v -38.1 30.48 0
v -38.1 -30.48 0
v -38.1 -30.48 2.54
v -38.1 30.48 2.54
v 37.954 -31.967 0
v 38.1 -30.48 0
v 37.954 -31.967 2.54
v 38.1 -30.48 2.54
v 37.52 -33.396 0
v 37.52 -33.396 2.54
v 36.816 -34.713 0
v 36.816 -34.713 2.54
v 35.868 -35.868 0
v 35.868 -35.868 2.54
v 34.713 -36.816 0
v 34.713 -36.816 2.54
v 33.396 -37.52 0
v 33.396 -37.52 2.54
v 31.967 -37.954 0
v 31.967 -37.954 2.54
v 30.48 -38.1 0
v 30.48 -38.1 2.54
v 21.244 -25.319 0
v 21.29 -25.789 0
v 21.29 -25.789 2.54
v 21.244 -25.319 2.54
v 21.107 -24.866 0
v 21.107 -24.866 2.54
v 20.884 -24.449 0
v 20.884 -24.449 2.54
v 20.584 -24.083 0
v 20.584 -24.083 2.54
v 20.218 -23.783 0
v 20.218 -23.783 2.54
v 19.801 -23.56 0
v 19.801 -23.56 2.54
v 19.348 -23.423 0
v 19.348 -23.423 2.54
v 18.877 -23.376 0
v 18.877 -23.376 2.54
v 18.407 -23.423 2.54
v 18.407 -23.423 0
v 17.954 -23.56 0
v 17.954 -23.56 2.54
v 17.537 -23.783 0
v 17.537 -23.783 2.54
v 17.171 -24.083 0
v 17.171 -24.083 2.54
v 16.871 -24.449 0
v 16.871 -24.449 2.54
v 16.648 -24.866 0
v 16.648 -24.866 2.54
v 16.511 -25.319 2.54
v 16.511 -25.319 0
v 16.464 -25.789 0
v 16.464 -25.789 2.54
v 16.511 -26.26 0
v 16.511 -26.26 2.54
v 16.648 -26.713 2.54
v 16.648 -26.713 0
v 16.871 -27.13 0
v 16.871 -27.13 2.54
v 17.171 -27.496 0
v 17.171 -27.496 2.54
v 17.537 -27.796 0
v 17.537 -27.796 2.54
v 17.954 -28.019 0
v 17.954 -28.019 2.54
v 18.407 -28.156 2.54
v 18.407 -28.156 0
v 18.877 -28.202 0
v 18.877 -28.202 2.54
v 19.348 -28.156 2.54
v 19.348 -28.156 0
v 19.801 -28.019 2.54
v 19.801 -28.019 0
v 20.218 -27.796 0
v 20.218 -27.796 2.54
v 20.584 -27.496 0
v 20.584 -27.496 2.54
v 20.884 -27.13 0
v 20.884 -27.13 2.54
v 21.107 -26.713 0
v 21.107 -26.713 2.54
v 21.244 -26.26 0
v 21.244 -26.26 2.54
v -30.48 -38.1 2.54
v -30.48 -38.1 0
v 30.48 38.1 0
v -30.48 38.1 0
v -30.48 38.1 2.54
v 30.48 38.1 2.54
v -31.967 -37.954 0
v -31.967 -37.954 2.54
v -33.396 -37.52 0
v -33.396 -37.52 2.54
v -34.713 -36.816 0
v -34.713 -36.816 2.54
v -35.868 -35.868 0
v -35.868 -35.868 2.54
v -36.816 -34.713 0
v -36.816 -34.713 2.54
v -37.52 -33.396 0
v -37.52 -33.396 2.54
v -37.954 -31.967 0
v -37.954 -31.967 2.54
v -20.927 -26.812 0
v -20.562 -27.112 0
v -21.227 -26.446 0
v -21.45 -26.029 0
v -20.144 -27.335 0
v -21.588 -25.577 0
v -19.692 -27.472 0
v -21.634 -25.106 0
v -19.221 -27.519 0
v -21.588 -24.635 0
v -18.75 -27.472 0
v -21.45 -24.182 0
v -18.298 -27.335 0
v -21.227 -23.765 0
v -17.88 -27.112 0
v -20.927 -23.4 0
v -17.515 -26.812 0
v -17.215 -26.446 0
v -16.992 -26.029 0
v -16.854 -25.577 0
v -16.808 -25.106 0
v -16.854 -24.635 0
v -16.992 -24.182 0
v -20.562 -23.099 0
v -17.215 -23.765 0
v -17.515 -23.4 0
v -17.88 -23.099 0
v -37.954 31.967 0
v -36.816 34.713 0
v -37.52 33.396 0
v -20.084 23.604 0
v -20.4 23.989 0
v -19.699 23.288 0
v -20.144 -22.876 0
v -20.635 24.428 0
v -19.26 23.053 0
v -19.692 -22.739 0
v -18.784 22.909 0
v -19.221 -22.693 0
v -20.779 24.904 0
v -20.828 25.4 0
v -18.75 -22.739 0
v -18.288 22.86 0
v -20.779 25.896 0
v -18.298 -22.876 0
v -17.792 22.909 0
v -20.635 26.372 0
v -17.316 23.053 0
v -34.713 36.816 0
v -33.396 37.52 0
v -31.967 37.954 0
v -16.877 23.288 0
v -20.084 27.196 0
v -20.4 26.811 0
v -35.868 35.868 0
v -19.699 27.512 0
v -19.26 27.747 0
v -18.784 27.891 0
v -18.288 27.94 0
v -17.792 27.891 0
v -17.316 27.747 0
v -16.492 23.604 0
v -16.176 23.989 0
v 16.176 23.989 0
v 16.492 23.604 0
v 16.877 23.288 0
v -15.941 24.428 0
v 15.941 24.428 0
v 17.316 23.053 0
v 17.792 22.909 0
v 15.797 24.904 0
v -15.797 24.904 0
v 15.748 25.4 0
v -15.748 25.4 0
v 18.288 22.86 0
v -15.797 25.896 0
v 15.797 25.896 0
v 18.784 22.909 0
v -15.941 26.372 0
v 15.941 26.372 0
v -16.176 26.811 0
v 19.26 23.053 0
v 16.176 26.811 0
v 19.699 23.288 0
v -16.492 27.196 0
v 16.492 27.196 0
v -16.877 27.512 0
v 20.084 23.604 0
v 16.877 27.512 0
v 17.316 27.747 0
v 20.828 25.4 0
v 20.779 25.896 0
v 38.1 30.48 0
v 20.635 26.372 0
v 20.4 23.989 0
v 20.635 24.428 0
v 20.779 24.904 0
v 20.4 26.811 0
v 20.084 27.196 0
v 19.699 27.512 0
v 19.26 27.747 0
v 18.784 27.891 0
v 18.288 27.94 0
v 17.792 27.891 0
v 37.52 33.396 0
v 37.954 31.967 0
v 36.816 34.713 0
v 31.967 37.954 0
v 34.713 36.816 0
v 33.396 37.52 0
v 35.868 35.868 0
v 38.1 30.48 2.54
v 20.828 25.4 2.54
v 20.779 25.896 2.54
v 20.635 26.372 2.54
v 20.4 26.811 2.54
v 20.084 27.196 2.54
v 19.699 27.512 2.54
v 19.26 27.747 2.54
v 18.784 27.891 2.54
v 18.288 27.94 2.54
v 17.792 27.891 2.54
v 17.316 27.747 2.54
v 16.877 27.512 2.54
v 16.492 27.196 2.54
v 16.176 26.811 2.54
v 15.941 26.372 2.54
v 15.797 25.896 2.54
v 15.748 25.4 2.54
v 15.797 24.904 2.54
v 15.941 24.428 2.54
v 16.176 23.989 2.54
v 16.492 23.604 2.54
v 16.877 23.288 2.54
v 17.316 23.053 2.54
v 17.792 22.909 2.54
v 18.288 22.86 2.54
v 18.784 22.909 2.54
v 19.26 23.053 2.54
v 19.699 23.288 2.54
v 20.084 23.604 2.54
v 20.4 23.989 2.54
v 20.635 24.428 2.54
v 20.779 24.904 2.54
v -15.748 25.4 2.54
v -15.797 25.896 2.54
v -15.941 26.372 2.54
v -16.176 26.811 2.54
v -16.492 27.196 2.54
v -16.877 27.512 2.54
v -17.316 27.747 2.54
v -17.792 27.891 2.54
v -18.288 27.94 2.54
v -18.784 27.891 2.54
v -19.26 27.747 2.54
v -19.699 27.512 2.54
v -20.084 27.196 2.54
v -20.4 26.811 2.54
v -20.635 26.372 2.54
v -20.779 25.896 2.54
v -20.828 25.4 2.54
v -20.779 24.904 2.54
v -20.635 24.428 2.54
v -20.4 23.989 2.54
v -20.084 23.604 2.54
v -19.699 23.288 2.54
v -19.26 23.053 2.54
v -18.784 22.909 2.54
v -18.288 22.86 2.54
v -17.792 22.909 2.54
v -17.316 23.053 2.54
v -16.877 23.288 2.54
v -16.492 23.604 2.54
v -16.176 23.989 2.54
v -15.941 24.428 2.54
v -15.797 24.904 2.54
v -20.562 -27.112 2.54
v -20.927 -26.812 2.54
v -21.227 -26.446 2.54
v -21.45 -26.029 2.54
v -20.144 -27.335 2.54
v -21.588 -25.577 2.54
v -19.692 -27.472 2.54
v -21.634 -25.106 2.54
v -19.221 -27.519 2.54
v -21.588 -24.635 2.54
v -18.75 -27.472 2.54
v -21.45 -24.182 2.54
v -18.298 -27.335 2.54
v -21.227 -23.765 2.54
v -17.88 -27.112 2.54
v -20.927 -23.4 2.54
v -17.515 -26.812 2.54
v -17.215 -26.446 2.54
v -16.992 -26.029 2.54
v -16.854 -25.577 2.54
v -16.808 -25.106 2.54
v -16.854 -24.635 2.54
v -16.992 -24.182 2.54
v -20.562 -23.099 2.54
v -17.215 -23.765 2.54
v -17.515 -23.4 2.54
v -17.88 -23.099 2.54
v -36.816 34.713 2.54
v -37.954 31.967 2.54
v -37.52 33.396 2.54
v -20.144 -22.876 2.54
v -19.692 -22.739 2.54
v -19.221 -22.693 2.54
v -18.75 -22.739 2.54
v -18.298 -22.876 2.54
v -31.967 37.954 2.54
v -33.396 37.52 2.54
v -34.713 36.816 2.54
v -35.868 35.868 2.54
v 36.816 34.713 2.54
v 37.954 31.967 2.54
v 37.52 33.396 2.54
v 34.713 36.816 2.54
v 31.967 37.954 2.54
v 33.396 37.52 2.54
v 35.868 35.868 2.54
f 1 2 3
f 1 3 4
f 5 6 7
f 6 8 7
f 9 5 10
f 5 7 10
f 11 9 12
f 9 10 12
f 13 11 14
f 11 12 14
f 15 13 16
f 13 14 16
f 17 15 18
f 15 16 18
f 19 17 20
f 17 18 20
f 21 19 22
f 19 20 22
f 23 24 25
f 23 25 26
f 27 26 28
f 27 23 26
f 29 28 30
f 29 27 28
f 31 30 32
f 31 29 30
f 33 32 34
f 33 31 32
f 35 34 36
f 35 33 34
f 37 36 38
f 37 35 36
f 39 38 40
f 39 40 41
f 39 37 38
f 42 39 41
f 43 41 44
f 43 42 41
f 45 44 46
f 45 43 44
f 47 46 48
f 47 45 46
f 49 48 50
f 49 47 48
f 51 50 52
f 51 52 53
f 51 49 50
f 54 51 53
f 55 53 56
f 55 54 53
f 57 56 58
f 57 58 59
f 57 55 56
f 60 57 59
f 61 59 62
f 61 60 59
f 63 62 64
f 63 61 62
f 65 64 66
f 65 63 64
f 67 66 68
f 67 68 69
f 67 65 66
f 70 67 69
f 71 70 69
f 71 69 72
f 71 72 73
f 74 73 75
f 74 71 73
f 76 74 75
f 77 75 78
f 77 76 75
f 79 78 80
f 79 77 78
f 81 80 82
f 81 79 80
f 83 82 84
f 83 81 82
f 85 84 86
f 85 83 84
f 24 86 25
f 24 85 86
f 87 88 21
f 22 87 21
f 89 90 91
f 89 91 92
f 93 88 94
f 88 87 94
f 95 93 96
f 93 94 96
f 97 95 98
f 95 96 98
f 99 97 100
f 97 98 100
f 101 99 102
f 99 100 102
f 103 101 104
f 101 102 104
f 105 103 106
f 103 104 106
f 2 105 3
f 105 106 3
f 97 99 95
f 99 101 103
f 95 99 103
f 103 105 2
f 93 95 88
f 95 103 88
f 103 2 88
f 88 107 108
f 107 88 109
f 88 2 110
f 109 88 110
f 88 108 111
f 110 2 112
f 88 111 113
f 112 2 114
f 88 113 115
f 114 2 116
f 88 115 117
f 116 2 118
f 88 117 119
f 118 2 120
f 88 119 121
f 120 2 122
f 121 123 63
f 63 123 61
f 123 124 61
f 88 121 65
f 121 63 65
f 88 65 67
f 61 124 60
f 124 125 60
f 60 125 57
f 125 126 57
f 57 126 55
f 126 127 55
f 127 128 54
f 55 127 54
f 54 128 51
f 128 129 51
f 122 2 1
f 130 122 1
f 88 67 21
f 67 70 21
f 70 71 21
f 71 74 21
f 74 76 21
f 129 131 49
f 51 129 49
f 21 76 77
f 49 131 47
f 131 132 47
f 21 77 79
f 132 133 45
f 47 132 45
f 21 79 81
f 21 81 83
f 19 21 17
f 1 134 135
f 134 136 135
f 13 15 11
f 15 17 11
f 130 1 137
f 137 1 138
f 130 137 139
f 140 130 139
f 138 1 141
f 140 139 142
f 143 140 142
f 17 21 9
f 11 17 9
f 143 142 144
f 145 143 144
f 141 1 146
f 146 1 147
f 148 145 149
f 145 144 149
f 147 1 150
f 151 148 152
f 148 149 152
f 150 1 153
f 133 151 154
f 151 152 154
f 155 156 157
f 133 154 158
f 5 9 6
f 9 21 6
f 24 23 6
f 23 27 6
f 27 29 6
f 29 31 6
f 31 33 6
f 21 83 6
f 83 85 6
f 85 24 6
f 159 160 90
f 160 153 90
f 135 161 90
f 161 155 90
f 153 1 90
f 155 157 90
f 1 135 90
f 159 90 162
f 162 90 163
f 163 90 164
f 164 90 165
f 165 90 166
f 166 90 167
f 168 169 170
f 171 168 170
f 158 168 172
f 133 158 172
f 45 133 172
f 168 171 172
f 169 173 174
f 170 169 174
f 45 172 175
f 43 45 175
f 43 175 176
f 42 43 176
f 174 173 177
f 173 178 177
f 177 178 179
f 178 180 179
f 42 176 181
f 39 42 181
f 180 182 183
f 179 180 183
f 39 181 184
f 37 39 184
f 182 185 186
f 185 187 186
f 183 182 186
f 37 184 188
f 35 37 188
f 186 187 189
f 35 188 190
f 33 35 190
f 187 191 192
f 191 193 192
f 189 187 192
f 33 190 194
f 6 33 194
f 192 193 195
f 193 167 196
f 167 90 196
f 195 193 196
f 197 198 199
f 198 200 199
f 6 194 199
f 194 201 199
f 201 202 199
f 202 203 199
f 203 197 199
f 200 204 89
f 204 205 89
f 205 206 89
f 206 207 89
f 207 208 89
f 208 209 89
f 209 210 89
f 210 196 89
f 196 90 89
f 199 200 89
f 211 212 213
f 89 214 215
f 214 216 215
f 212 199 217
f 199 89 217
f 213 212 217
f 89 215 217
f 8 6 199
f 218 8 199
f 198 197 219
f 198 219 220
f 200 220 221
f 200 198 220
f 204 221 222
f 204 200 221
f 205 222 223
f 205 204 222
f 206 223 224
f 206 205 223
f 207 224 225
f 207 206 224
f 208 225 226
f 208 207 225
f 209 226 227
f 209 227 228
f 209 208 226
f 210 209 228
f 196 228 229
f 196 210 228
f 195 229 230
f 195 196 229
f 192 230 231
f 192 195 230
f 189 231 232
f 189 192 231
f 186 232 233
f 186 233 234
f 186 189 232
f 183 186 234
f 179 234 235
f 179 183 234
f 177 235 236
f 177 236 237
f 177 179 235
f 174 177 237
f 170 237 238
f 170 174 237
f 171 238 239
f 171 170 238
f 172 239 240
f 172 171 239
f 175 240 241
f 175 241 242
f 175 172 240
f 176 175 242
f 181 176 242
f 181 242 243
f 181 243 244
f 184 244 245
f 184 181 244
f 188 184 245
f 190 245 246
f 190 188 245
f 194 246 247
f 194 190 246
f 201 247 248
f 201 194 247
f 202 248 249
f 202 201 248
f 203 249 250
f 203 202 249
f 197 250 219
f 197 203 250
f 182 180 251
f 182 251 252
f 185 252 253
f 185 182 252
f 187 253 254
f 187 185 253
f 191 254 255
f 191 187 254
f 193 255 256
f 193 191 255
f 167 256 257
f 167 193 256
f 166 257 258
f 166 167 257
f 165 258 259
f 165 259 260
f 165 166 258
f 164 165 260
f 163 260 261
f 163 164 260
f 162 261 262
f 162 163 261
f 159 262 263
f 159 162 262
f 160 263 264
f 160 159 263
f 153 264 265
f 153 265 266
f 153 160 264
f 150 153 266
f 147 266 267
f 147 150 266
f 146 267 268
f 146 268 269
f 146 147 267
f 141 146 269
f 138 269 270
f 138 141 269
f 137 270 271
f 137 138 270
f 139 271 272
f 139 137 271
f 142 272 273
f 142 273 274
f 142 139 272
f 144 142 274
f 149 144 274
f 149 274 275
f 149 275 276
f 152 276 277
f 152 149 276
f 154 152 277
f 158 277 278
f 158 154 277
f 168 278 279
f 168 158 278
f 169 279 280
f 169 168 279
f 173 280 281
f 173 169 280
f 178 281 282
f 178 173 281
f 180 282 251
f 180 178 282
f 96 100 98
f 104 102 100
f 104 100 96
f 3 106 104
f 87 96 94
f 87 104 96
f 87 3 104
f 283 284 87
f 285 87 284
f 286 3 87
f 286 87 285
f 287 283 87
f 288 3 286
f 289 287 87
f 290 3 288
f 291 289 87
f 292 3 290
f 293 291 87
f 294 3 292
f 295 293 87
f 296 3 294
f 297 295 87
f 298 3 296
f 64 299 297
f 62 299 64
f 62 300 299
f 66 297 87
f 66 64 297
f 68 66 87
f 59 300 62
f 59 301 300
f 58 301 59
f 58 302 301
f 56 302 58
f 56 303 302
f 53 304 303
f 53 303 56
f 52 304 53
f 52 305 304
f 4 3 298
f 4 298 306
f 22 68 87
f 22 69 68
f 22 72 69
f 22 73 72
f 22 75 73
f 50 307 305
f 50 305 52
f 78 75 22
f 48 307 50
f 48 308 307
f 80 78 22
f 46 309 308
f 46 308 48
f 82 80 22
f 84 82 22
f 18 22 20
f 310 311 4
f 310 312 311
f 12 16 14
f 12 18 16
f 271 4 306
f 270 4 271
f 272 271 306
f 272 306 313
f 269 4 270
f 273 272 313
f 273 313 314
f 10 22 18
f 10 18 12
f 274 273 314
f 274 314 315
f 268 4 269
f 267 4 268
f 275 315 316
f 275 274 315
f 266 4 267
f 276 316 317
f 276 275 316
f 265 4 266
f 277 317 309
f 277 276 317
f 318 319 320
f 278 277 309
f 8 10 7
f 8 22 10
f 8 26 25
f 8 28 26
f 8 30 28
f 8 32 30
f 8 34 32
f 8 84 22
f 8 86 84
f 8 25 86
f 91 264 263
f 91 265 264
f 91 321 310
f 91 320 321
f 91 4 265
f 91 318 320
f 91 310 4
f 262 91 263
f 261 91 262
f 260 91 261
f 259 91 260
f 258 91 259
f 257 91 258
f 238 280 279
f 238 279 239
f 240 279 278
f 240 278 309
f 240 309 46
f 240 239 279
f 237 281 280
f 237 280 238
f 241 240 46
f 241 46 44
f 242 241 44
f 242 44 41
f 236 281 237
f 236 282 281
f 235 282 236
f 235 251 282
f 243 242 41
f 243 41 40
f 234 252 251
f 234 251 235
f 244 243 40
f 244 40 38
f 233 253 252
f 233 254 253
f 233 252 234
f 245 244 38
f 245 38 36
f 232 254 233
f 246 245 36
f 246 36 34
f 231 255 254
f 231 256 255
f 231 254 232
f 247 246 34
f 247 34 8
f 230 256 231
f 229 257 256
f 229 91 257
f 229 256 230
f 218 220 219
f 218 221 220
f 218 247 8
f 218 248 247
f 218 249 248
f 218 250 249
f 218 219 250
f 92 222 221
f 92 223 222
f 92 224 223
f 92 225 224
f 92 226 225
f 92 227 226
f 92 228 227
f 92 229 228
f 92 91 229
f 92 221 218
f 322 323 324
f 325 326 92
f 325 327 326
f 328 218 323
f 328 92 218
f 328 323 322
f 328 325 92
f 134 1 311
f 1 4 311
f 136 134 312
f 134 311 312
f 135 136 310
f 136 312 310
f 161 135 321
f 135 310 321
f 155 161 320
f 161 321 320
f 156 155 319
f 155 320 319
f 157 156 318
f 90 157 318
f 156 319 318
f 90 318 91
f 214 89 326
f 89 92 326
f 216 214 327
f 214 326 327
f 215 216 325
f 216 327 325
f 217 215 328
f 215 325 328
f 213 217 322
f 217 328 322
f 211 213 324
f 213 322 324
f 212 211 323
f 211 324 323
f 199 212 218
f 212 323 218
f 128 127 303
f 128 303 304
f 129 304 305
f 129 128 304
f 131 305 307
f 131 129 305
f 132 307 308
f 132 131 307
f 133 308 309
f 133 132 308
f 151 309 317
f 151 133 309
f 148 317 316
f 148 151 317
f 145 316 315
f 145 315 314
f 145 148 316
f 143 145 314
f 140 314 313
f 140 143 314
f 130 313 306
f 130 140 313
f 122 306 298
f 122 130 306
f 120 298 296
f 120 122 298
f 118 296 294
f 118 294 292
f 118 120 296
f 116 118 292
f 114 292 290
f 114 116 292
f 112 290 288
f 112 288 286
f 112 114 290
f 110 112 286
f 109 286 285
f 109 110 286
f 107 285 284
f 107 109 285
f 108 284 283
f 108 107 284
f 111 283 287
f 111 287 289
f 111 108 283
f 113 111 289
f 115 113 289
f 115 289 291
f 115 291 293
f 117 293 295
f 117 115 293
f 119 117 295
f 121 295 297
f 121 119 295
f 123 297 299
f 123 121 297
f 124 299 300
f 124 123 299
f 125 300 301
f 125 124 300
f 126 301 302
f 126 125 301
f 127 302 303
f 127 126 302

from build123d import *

# Parameters (mm, degrees)
SKETCH1_W           = 76.2
SKETCH1_H           = 76.2
SKETCH1_R           = 2.54
BOSS_EXTRUDE1_DEPTH = 2.54
FILLET1_R           = 7.62
FILLET2_R           = 7.62
FILLET3_R           = 7.62
FILLET4_R           = 7.62
CAVITY1_OUTLINE_R   = 2.413
CAVITY1_DEPTH       = 2.54


# Read off the part's stored shape, not the designer's step: Cavity1
with BuildPart() as part:
    # Sketch1 → Boss-Extrude1 (new body)
    with BuildSketch(Plane.XY):
        Rectangle(SKETCH1_W, SKETCH1_H)
        with Locations((-18.288, 25.4)):
            Circle(SKETCH1_R, mode=Mode.SUBTRACT)
        with Locations((18.288, 25.4)):
            Circle(SKETCH1_R, mode=Mode.SUBTRACT)
    extrude(amount=BOSS_EXTRUDE1_DEPTH)

    # Fillet1
    fillet1_edges = [part.edges().sort_by_distance(p)[0] for p in [
        (38.1, 38.1, 1.27),
    ]]
    fillet(fillet1_edges, radius=FILLET1_R)

    # Fillet2
    fillet2_edges = [part.edges().sort_by_distance(p)[0] for p in [
        (38.1, -38.1, 1.27),
    ]]
    fillet(fillet2_edges, radius=FILLET2_R)

    # Fillet3
    fillet3_edges = [part.edges().sort_by_distance(p)[0] for p in [
        (-38.1, -38.1, 1.27),
    ]]
    fillet(fillet3_edges, radius=FILLET3_R)

    # Fillet4
    fillet4_edges = [part.edges().sort_by_distance(p)[0] for p in [
        (-38.1, 38.1, 1.27),
    ]]
    fillet(fillet4_edges, radius=FILLET4_R)

    # Cavity1 outline → Cavity1 (cut)
    with BuildSketch(Plane.XY):
        with Locations((18.877459074, -25.789271924)):
            Circle(CAVITY1_OUTLINE_R)
        with Locations((-19.220954695, -25.105760078)):
            Circle(CAVITY1_OUTLINE_R)
    extrude(amount=CAVITY1_DEPTH, mode=Mode.SUBTRACT)


solid = part.part
